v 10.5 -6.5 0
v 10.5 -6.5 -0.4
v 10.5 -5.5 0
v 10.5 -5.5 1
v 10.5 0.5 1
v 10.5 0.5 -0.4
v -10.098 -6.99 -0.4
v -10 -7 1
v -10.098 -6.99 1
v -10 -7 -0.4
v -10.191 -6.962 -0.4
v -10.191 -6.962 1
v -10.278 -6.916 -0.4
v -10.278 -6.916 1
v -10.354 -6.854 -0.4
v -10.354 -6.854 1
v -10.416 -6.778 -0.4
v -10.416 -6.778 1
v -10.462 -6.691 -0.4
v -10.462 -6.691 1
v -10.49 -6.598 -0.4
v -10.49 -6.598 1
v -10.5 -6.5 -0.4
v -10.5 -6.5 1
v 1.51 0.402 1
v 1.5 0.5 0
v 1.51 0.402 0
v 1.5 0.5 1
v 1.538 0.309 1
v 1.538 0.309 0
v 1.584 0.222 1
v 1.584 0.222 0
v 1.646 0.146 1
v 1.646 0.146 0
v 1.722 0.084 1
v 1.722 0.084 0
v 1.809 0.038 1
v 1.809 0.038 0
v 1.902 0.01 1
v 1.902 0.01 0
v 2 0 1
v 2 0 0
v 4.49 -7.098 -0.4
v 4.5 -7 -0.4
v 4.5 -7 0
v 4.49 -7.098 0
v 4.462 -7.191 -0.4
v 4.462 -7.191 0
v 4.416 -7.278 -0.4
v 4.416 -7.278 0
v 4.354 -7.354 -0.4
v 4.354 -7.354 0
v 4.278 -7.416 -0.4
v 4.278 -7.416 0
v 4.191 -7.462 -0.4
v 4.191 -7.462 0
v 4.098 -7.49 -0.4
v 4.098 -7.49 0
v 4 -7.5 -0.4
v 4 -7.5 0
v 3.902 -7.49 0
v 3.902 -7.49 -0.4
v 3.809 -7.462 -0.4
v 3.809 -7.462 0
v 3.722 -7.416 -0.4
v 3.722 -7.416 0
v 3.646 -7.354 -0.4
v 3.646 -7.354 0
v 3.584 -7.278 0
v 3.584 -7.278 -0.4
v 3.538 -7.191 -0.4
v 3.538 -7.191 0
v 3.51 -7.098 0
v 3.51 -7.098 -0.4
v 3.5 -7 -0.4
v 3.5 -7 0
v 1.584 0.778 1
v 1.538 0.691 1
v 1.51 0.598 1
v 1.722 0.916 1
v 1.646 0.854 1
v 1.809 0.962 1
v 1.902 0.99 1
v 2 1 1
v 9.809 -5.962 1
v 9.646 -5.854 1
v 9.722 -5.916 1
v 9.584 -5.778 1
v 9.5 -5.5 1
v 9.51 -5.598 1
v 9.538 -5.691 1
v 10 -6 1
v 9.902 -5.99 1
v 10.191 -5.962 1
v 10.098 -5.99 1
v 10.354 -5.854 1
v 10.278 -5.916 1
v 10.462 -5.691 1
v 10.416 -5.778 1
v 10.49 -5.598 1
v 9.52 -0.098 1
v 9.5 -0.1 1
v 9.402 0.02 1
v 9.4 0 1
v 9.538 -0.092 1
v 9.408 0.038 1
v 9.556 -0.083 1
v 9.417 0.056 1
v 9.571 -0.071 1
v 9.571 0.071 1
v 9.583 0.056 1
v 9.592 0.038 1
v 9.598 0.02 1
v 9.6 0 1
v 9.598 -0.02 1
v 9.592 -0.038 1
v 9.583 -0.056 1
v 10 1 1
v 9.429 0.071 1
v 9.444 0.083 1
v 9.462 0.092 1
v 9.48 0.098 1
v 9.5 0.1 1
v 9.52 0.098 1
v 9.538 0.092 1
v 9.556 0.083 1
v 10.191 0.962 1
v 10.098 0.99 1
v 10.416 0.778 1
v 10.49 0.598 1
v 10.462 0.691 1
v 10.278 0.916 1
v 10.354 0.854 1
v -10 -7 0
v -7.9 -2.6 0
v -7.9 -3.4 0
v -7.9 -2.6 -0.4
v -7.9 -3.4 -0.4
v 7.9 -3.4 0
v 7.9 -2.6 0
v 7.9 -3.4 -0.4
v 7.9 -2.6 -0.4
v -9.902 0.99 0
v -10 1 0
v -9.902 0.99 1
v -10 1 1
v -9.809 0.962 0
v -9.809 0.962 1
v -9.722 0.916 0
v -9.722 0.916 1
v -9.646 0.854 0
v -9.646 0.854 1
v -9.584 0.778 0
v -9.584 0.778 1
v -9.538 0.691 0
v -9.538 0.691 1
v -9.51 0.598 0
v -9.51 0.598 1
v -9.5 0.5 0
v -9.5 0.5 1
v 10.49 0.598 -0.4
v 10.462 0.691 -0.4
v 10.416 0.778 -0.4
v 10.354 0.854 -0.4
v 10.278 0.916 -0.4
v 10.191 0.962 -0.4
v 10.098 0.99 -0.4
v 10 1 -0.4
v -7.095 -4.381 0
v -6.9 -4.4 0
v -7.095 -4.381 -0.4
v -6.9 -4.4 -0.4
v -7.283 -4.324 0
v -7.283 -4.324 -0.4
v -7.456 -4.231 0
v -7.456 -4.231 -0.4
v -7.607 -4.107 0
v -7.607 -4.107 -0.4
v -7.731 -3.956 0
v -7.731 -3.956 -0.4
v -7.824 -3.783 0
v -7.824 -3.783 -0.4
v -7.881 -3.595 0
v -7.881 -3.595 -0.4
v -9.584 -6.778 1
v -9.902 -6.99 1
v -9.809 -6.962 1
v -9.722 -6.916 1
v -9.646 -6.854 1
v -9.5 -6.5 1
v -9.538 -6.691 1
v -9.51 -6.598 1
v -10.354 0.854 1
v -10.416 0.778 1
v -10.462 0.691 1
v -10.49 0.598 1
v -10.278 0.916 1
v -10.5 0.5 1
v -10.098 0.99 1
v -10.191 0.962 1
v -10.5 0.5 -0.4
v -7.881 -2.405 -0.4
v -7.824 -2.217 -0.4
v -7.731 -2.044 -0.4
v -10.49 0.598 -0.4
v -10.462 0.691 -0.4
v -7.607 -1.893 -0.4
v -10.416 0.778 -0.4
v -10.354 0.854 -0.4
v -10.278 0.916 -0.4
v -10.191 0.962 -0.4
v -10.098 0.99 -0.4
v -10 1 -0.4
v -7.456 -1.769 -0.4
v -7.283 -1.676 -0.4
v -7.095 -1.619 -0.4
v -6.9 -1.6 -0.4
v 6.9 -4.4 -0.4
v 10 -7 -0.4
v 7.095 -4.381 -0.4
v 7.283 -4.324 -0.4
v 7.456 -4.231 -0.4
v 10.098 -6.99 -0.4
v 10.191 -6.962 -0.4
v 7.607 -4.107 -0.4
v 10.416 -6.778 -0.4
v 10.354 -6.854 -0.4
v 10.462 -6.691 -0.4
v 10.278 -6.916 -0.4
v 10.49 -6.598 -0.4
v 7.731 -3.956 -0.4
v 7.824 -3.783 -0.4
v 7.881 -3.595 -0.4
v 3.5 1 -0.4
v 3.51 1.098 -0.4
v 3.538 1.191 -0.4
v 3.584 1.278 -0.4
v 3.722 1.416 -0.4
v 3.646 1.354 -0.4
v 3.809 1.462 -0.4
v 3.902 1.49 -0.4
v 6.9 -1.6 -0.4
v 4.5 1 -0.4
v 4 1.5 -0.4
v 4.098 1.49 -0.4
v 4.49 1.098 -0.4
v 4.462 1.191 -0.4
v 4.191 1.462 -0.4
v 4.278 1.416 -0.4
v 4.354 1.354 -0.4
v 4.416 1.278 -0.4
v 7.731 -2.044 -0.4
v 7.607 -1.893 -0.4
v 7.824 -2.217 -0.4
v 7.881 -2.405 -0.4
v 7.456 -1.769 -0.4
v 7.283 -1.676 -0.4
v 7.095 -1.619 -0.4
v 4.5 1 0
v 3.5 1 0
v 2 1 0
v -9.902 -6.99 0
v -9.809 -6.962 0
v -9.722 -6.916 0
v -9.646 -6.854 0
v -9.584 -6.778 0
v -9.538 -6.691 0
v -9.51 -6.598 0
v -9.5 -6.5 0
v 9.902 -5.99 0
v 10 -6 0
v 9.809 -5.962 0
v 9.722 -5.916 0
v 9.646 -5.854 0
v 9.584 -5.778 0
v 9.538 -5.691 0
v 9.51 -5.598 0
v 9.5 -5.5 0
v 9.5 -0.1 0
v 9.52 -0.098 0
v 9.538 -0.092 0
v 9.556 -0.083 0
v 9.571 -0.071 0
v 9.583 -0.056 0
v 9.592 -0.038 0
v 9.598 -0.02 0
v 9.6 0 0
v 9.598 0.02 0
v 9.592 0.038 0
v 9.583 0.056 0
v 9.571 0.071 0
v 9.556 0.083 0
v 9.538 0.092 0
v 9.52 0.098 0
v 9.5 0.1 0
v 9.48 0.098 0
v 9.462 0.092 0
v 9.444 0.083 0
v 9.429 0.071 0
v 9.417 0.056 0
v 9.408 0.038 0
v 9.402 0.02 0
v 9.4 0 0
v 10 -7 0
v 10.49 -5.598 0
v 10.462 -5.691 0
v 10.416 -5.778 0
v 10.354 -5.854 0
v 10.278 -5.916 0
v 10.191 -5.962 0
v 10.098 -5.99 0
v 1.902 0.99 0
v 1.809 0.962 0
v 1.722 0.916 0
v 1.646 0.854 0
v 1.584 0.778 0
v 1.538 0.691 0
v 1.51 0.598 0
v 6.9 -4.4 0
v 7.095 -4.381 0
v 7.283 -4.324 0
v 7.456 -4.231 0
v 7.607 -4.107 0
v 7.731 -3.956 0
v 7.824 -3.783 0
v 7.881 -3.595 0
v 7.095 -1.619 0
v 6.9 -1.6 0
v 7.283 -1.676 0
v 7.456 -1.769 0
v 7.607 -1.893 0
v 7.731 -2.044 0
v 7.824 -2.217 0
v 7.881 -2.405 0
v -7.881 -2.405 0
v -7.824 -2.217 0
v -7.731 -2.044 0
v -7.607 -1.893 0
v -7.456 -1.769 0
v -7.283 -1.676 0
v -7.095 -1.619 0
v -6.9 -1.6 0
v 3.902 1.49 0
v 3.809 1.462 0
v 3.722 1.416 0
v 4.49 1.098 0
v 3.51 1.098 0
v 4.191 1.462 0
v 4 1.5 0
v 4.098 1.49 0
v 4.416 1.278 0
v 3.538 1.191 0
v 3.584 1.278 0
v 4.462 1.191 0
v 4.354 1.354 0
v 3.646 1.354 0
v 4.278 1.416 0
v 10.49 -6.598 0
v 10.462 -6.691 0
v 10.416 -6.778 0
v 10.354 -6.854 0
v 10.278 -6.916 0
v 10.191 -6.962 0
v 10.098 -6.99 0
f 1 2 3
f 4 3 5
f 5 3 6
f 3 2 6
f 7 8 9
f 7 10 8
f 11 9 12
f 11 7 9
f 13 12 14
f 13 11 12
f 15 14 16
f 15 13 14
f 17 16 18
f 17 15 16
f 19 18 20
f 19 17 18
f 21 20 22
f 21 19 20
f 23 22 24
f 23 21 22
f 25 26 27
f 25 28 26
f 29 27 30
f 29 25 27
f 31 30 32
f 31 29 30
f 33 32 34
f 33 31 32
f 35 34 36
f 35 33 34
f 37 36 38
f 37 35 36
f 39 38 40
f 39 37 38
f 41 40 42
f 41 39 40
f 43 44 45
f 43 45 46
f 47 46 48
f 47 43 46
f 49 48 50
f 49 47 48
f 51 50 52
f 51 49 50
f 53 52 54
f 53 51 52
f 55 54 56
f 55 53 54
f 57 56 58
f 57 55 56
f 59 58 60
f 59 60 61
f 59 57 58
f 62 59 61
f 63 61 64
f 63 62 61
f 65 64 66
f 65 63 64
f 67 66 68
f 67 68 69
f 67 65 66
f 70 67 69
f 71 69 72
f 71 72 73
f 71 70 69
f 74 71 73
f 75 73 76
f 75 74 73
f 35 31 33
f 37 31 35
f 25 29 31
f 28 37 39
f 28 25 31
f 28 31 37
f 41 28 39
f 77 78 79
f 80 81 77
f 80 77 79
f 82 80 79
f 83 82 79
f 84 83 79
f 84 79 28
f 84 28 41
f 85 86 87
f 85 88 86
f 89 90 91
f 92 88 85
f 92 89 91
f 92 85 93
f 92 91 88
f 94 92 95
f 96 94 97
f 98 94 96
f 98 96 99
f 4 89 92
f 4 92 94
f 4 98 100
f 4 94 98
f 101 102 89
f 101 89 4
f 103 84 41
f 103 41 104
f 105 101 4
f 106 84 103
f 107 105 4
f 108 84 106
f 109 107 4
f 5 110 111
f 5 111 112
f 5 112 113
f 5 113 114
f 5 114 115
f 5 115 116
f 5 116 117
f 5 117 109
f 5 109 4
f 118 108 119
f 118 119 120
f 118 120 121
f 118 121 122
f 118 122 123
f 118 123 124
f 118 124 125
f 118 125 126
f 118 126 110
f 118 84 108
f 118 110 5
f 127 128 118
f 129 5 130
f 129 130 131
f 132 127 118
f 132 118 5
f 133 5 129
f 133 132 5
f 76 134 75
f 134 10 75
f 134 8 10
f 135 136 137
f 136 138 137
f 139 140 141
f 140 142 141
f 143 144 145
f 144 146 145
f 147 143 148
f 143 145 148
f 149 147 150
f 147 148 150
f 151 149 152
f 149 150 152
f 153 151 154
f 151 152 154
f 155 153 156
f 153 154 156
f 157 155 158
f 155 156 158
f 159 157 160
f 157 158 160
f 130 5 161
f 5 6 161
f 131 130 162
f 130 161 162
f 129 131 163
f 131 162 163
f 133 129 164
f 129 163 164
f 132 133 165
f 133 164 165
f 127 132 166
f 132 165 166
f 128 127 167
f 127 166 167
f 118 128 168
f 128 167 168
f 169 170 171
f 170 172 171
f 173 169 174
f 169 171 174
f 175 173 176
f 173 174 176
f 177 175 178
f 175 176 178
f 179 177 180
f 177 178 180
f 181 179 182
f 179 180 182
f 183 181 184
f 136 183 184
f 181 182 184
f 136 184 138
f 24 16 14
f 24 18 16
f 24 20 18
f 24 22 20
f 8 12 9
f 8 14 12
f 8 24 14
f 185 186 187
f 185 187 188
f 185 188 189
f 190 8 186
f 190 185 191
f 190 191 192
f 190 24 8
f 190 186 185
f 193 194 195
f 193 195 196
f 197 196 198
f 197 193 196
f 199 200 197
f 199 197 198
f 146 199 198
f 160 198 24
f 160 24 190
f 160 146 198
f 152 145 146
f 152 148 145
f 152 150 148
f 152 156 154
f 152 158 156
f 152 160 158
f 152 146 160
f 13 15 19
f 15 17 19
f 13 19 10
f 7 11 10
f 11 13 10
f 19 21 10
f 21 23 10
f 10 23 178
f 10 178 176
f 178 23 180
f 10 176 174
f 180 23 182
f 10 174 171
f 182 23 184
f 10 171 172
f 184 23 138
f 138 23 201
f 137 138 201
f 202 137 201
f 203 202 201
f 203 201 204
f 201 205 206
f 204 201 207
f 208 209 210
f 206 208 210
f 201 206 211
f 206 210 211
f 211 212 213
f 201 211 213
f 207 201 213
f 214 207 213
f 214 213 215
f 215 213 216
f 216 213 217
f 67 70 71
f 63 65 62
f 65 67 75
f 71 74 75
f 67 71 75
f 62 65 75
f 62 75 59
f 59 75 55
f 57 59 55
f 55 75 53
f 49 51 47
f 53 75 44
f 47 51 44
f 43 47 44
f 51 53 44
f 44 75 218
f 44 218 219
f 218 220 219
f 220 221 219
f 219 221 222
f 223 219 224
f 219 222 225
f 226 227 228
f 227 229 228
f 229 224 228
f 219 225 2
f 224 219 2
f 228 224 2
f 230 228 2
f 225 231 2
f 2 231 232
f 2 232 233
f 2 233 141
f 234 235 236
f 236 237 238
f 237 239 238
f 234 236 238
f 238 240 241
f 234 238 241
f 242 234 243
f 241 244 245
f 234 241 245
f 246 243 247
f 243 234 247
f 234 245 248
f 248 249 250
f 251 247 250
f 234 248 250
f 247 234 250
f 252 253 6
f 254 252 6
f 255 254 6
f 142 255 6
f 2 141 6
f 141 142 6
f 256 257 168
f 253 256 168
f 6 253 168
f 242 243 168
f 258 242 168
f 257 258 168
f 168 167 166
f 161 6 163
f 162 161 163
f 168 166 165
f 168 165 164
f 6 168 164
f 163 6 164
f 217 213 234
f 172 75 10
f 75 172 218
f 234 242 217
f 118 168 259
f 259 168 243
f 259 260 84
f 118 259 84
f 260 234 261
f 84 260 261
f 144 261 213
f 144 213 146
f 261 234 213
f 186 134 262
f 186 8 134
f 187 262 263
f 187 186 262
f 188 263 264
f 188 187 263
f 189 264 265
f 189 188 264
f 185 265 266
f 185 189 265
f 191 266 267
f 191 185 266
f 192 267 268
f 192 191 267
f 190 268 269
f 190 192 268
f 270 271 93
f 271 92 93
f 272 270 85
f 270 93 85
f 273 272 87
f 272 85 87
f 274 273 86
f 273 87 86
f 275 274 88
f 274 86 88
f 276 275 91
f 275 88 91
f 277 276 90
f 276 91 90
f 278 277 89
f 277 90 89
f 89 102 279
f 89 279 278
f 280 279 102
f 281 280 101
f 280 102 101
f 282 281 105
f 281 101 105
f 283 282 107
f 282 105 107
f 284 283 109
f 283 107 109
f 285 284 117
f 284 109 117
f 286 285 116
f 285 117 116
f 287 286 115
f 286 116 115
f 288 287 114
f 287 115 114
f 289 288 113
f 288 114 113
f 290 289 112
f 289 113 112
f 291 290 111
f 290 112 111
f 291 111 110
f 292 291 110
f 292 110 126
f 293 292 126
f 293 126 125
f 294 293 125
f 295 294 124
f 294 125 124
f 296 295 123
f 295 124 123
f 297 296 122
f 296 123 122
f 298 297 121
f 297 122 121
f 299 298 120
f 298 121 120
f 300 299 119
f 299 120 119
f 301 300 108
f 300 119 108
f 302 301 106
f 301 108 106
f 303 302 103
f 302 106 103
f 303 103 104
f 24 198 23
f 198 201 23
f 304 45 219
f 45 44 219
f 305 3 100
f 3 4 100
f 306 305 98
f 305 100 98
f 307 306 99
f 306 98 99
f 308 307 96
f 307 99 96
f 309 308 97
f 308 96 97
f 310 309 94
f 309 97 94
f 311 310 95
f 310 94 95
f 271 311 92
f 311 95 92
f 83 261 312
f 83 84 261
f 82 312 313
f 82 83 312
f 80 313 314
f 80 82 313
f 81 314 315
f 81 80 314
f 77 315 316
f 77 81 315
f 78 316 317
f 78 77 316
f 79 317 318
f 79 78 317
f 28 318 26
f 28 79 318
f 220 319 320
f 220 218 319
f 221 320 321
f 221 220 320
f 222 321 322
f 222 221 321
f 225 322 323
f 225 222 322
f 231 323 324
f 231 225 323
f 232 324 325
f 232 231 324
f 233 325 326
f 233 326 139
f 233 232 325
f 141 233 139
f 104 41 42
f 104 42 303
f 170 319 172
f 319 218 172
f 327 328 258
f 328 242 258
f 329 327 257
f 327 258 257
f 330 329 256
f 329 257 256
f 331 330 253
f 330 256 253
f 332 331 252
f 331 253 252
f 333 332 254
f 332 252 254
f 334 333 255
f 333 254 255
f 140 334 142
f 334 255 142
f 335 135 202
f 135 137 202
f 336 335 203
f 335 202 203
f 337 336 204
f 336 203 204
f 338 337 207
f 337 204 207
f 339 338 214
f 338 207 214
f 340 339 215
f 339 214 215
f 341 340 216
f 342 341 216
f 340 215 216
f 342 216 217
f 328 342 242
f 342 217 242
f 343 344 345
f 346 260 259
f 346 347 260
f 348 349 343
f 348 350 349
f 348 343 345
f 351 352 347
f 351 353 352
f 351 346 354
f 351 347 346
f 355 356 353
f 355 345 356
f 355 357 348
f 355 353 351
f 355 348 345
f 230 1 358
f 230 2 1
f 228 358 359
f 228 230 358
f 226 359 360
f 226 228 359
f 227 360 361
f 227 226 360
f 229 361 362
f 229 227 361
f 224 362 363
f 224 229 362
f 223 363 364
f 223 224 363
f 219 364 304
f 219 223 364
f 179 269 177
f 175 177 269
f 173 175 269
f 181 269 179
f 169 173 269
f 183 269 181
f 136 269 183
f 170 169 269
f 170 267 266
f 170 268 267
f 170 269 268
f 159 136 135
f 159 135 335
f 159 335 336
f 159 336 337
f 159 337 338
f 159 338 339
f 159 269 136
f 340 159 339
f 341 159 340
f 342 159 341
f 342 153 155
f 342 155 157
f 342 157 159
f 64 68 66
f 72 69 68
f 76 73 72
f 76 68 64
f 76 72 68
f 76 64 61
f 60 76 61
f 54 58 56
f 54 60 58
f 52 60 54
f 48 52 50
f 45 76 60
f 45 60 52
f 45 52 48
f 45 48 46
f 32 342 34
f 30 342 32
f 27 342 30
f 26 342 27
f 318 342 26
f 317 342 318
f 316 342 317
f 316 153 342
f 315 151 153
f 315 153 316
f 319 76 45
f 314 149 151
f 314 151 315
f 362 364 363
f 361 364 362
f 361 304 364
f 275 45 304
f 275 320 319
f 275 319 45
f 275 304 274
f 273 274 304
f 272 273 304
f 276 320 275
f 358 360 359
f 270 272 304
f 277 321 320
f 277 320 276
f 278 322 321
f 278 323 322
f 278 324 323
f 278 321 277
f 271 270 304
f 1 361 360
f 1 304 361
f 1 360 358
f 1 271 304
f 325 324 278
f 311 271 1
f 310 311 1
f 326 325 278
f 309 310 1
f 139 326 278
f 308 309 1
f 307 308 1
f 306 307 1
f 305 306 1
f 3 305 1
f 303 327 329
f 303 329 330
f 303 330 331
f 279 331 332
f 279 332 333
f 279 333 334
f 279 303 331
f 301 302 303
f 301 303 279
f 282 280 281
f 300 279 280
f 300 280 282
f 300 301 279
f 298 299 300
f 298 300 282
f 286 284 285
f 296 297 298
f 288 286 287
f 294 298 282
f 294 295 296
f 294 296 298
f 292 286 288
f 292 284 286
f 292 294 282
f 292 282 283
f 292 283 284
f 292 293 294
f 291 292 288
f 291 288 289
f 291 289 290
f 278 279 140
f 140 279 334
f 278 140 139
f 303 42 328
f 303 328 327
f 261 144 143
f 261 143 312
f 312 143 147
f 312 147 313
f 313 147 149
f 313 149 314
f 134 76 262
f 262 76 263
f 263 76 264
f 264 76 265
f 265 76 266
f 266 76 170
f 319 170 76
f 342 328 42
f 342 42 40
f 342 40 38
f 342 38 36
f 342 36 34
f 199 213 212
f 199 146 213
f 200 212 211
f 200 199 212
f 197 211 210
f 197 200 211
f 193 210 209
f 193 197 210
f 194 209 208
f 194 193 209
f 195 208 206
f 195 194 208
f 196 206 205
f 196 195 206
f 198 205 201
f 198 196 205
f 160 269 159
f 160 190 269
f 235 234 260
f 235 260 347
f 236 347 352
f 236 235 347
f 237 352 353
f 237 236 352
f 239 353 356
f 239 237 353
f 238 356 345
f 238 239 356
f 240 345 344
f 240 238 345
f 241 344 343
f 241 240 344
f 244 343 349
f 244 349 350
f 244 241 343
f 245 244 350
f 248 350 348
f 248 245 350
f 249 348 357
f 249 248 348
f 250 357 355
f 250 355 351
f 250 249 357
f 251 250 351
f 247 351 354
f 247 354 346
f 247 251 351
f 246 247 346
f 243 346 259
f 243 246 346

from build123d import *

# Parameters (mm, degrees)
F4_W     = 3
F4_H     = 1
F6_R     = 1
F7_R     = 0.49999
F8_R     = 0.1
F9_DEPTH = 1


# Not quite as in the source:
# - a fillet or chamfer is up to 0.001 mm smaller than in the source, because OpenCascade refuses the exact size


with BuildPart() as f3:
    # F3: sweep along a path in F1
    with BuildLine(Plane.XZ) as f3_path:
        Line((0, 0), (0, -0.4))
    # F2 (on Top) → F3 (sweep)
    with BuildSketch(Plane.XY):
        Polygon((10.5, -7), (10.5, 1), (4.5, 1), (3.5, 1), (-10.5, 1), (-10.5, -7), (3.5, -7), (4.5, -7), align=None)
        Polygon((-7.9, -4.4), (-7.9, -1.6), (-4.5, -1.6), (4.5, -1.6), (7.9, -1.6), (7.9, -4.4), align=None, mode=Mode.SUBTRACT)
        with BuildLine():
            Line((3.5, 1), (4.5, 1))
            ThreePointArc((4.5, 1), (4, 1.5), (3.5, 1))
        make_face()
        with BuildLine():
            ThreePointArc((3.5, -7), (4, -7.5), (4.5, -7))
            Line((4.5, -7), (3.5, -7))
        make_face()
    sweep(path=f3_path.line)

    # F5: sweep along a path in F1
    with BuildLine(Plane.XZ) as f5_path:
        Line((0, 0), (0, 1))
    # F4 (on face) → F5 (sweep)
    with BuildSketch(Plane.XY):
        Polygon((4.5, 0), (9.5, 0), (9.5, -6), (10.5, -6), (10.5, 1), (4.5, 1), align=None)
        with Locations((3, 0.5)):
            Rectangle(F4_W, F4_H)
        Polygon((-9.5, -6), (-9.5, 0), (-9.5, 1), (-10.5, 1), (-10.5, -7), (-9.5, -7), align=None)
    sweep(path=f5_path.line)

    # F6
    f6_edges = [f3.edges().sort_by_distance(p)[0] for p in [
        (-7.9, -1.6, -0.2),
        (-7.9, -4.4, -0.2),
        (7.9, -1.6, -0.2),
        (7.9, -4.4, -0.2),
    ]]
    fillet(f6_edges, radius=F6_R)

    # F7 (radius 0.5 in the source; OpenCascade refuses exactly that, so slightly less here)
    f7_edges = [f3.edges().sort_by_distance(p)[0] for p in [
        (-10.5, -7, 0.3),
        (-10.5, 1, 0.3),
        (9.5, -6, 0.5),
        (10.5, -6, 0.5),
        (1.5, 0, 0.5),
        (10.5, -7, -0.2),
        (10.5, 1, 0.3),
        (1.5, 1, 0.5),
        (-9.5, 1, 0.5),
        (-9.5, -7, 0.5),
    ]]
    fillet(f7_edges, radius=F7_R)

    # F8 (on face) → F9 (cut, through all)
    with BuildSketch(Plane.XY.offset(1)):
        with Locations((9.5, 0)):
            Circle(F8_R)
    extrude(amount=-F9_DEPTH, mode=Mode.SUBTRACT)


solid = f3.part
